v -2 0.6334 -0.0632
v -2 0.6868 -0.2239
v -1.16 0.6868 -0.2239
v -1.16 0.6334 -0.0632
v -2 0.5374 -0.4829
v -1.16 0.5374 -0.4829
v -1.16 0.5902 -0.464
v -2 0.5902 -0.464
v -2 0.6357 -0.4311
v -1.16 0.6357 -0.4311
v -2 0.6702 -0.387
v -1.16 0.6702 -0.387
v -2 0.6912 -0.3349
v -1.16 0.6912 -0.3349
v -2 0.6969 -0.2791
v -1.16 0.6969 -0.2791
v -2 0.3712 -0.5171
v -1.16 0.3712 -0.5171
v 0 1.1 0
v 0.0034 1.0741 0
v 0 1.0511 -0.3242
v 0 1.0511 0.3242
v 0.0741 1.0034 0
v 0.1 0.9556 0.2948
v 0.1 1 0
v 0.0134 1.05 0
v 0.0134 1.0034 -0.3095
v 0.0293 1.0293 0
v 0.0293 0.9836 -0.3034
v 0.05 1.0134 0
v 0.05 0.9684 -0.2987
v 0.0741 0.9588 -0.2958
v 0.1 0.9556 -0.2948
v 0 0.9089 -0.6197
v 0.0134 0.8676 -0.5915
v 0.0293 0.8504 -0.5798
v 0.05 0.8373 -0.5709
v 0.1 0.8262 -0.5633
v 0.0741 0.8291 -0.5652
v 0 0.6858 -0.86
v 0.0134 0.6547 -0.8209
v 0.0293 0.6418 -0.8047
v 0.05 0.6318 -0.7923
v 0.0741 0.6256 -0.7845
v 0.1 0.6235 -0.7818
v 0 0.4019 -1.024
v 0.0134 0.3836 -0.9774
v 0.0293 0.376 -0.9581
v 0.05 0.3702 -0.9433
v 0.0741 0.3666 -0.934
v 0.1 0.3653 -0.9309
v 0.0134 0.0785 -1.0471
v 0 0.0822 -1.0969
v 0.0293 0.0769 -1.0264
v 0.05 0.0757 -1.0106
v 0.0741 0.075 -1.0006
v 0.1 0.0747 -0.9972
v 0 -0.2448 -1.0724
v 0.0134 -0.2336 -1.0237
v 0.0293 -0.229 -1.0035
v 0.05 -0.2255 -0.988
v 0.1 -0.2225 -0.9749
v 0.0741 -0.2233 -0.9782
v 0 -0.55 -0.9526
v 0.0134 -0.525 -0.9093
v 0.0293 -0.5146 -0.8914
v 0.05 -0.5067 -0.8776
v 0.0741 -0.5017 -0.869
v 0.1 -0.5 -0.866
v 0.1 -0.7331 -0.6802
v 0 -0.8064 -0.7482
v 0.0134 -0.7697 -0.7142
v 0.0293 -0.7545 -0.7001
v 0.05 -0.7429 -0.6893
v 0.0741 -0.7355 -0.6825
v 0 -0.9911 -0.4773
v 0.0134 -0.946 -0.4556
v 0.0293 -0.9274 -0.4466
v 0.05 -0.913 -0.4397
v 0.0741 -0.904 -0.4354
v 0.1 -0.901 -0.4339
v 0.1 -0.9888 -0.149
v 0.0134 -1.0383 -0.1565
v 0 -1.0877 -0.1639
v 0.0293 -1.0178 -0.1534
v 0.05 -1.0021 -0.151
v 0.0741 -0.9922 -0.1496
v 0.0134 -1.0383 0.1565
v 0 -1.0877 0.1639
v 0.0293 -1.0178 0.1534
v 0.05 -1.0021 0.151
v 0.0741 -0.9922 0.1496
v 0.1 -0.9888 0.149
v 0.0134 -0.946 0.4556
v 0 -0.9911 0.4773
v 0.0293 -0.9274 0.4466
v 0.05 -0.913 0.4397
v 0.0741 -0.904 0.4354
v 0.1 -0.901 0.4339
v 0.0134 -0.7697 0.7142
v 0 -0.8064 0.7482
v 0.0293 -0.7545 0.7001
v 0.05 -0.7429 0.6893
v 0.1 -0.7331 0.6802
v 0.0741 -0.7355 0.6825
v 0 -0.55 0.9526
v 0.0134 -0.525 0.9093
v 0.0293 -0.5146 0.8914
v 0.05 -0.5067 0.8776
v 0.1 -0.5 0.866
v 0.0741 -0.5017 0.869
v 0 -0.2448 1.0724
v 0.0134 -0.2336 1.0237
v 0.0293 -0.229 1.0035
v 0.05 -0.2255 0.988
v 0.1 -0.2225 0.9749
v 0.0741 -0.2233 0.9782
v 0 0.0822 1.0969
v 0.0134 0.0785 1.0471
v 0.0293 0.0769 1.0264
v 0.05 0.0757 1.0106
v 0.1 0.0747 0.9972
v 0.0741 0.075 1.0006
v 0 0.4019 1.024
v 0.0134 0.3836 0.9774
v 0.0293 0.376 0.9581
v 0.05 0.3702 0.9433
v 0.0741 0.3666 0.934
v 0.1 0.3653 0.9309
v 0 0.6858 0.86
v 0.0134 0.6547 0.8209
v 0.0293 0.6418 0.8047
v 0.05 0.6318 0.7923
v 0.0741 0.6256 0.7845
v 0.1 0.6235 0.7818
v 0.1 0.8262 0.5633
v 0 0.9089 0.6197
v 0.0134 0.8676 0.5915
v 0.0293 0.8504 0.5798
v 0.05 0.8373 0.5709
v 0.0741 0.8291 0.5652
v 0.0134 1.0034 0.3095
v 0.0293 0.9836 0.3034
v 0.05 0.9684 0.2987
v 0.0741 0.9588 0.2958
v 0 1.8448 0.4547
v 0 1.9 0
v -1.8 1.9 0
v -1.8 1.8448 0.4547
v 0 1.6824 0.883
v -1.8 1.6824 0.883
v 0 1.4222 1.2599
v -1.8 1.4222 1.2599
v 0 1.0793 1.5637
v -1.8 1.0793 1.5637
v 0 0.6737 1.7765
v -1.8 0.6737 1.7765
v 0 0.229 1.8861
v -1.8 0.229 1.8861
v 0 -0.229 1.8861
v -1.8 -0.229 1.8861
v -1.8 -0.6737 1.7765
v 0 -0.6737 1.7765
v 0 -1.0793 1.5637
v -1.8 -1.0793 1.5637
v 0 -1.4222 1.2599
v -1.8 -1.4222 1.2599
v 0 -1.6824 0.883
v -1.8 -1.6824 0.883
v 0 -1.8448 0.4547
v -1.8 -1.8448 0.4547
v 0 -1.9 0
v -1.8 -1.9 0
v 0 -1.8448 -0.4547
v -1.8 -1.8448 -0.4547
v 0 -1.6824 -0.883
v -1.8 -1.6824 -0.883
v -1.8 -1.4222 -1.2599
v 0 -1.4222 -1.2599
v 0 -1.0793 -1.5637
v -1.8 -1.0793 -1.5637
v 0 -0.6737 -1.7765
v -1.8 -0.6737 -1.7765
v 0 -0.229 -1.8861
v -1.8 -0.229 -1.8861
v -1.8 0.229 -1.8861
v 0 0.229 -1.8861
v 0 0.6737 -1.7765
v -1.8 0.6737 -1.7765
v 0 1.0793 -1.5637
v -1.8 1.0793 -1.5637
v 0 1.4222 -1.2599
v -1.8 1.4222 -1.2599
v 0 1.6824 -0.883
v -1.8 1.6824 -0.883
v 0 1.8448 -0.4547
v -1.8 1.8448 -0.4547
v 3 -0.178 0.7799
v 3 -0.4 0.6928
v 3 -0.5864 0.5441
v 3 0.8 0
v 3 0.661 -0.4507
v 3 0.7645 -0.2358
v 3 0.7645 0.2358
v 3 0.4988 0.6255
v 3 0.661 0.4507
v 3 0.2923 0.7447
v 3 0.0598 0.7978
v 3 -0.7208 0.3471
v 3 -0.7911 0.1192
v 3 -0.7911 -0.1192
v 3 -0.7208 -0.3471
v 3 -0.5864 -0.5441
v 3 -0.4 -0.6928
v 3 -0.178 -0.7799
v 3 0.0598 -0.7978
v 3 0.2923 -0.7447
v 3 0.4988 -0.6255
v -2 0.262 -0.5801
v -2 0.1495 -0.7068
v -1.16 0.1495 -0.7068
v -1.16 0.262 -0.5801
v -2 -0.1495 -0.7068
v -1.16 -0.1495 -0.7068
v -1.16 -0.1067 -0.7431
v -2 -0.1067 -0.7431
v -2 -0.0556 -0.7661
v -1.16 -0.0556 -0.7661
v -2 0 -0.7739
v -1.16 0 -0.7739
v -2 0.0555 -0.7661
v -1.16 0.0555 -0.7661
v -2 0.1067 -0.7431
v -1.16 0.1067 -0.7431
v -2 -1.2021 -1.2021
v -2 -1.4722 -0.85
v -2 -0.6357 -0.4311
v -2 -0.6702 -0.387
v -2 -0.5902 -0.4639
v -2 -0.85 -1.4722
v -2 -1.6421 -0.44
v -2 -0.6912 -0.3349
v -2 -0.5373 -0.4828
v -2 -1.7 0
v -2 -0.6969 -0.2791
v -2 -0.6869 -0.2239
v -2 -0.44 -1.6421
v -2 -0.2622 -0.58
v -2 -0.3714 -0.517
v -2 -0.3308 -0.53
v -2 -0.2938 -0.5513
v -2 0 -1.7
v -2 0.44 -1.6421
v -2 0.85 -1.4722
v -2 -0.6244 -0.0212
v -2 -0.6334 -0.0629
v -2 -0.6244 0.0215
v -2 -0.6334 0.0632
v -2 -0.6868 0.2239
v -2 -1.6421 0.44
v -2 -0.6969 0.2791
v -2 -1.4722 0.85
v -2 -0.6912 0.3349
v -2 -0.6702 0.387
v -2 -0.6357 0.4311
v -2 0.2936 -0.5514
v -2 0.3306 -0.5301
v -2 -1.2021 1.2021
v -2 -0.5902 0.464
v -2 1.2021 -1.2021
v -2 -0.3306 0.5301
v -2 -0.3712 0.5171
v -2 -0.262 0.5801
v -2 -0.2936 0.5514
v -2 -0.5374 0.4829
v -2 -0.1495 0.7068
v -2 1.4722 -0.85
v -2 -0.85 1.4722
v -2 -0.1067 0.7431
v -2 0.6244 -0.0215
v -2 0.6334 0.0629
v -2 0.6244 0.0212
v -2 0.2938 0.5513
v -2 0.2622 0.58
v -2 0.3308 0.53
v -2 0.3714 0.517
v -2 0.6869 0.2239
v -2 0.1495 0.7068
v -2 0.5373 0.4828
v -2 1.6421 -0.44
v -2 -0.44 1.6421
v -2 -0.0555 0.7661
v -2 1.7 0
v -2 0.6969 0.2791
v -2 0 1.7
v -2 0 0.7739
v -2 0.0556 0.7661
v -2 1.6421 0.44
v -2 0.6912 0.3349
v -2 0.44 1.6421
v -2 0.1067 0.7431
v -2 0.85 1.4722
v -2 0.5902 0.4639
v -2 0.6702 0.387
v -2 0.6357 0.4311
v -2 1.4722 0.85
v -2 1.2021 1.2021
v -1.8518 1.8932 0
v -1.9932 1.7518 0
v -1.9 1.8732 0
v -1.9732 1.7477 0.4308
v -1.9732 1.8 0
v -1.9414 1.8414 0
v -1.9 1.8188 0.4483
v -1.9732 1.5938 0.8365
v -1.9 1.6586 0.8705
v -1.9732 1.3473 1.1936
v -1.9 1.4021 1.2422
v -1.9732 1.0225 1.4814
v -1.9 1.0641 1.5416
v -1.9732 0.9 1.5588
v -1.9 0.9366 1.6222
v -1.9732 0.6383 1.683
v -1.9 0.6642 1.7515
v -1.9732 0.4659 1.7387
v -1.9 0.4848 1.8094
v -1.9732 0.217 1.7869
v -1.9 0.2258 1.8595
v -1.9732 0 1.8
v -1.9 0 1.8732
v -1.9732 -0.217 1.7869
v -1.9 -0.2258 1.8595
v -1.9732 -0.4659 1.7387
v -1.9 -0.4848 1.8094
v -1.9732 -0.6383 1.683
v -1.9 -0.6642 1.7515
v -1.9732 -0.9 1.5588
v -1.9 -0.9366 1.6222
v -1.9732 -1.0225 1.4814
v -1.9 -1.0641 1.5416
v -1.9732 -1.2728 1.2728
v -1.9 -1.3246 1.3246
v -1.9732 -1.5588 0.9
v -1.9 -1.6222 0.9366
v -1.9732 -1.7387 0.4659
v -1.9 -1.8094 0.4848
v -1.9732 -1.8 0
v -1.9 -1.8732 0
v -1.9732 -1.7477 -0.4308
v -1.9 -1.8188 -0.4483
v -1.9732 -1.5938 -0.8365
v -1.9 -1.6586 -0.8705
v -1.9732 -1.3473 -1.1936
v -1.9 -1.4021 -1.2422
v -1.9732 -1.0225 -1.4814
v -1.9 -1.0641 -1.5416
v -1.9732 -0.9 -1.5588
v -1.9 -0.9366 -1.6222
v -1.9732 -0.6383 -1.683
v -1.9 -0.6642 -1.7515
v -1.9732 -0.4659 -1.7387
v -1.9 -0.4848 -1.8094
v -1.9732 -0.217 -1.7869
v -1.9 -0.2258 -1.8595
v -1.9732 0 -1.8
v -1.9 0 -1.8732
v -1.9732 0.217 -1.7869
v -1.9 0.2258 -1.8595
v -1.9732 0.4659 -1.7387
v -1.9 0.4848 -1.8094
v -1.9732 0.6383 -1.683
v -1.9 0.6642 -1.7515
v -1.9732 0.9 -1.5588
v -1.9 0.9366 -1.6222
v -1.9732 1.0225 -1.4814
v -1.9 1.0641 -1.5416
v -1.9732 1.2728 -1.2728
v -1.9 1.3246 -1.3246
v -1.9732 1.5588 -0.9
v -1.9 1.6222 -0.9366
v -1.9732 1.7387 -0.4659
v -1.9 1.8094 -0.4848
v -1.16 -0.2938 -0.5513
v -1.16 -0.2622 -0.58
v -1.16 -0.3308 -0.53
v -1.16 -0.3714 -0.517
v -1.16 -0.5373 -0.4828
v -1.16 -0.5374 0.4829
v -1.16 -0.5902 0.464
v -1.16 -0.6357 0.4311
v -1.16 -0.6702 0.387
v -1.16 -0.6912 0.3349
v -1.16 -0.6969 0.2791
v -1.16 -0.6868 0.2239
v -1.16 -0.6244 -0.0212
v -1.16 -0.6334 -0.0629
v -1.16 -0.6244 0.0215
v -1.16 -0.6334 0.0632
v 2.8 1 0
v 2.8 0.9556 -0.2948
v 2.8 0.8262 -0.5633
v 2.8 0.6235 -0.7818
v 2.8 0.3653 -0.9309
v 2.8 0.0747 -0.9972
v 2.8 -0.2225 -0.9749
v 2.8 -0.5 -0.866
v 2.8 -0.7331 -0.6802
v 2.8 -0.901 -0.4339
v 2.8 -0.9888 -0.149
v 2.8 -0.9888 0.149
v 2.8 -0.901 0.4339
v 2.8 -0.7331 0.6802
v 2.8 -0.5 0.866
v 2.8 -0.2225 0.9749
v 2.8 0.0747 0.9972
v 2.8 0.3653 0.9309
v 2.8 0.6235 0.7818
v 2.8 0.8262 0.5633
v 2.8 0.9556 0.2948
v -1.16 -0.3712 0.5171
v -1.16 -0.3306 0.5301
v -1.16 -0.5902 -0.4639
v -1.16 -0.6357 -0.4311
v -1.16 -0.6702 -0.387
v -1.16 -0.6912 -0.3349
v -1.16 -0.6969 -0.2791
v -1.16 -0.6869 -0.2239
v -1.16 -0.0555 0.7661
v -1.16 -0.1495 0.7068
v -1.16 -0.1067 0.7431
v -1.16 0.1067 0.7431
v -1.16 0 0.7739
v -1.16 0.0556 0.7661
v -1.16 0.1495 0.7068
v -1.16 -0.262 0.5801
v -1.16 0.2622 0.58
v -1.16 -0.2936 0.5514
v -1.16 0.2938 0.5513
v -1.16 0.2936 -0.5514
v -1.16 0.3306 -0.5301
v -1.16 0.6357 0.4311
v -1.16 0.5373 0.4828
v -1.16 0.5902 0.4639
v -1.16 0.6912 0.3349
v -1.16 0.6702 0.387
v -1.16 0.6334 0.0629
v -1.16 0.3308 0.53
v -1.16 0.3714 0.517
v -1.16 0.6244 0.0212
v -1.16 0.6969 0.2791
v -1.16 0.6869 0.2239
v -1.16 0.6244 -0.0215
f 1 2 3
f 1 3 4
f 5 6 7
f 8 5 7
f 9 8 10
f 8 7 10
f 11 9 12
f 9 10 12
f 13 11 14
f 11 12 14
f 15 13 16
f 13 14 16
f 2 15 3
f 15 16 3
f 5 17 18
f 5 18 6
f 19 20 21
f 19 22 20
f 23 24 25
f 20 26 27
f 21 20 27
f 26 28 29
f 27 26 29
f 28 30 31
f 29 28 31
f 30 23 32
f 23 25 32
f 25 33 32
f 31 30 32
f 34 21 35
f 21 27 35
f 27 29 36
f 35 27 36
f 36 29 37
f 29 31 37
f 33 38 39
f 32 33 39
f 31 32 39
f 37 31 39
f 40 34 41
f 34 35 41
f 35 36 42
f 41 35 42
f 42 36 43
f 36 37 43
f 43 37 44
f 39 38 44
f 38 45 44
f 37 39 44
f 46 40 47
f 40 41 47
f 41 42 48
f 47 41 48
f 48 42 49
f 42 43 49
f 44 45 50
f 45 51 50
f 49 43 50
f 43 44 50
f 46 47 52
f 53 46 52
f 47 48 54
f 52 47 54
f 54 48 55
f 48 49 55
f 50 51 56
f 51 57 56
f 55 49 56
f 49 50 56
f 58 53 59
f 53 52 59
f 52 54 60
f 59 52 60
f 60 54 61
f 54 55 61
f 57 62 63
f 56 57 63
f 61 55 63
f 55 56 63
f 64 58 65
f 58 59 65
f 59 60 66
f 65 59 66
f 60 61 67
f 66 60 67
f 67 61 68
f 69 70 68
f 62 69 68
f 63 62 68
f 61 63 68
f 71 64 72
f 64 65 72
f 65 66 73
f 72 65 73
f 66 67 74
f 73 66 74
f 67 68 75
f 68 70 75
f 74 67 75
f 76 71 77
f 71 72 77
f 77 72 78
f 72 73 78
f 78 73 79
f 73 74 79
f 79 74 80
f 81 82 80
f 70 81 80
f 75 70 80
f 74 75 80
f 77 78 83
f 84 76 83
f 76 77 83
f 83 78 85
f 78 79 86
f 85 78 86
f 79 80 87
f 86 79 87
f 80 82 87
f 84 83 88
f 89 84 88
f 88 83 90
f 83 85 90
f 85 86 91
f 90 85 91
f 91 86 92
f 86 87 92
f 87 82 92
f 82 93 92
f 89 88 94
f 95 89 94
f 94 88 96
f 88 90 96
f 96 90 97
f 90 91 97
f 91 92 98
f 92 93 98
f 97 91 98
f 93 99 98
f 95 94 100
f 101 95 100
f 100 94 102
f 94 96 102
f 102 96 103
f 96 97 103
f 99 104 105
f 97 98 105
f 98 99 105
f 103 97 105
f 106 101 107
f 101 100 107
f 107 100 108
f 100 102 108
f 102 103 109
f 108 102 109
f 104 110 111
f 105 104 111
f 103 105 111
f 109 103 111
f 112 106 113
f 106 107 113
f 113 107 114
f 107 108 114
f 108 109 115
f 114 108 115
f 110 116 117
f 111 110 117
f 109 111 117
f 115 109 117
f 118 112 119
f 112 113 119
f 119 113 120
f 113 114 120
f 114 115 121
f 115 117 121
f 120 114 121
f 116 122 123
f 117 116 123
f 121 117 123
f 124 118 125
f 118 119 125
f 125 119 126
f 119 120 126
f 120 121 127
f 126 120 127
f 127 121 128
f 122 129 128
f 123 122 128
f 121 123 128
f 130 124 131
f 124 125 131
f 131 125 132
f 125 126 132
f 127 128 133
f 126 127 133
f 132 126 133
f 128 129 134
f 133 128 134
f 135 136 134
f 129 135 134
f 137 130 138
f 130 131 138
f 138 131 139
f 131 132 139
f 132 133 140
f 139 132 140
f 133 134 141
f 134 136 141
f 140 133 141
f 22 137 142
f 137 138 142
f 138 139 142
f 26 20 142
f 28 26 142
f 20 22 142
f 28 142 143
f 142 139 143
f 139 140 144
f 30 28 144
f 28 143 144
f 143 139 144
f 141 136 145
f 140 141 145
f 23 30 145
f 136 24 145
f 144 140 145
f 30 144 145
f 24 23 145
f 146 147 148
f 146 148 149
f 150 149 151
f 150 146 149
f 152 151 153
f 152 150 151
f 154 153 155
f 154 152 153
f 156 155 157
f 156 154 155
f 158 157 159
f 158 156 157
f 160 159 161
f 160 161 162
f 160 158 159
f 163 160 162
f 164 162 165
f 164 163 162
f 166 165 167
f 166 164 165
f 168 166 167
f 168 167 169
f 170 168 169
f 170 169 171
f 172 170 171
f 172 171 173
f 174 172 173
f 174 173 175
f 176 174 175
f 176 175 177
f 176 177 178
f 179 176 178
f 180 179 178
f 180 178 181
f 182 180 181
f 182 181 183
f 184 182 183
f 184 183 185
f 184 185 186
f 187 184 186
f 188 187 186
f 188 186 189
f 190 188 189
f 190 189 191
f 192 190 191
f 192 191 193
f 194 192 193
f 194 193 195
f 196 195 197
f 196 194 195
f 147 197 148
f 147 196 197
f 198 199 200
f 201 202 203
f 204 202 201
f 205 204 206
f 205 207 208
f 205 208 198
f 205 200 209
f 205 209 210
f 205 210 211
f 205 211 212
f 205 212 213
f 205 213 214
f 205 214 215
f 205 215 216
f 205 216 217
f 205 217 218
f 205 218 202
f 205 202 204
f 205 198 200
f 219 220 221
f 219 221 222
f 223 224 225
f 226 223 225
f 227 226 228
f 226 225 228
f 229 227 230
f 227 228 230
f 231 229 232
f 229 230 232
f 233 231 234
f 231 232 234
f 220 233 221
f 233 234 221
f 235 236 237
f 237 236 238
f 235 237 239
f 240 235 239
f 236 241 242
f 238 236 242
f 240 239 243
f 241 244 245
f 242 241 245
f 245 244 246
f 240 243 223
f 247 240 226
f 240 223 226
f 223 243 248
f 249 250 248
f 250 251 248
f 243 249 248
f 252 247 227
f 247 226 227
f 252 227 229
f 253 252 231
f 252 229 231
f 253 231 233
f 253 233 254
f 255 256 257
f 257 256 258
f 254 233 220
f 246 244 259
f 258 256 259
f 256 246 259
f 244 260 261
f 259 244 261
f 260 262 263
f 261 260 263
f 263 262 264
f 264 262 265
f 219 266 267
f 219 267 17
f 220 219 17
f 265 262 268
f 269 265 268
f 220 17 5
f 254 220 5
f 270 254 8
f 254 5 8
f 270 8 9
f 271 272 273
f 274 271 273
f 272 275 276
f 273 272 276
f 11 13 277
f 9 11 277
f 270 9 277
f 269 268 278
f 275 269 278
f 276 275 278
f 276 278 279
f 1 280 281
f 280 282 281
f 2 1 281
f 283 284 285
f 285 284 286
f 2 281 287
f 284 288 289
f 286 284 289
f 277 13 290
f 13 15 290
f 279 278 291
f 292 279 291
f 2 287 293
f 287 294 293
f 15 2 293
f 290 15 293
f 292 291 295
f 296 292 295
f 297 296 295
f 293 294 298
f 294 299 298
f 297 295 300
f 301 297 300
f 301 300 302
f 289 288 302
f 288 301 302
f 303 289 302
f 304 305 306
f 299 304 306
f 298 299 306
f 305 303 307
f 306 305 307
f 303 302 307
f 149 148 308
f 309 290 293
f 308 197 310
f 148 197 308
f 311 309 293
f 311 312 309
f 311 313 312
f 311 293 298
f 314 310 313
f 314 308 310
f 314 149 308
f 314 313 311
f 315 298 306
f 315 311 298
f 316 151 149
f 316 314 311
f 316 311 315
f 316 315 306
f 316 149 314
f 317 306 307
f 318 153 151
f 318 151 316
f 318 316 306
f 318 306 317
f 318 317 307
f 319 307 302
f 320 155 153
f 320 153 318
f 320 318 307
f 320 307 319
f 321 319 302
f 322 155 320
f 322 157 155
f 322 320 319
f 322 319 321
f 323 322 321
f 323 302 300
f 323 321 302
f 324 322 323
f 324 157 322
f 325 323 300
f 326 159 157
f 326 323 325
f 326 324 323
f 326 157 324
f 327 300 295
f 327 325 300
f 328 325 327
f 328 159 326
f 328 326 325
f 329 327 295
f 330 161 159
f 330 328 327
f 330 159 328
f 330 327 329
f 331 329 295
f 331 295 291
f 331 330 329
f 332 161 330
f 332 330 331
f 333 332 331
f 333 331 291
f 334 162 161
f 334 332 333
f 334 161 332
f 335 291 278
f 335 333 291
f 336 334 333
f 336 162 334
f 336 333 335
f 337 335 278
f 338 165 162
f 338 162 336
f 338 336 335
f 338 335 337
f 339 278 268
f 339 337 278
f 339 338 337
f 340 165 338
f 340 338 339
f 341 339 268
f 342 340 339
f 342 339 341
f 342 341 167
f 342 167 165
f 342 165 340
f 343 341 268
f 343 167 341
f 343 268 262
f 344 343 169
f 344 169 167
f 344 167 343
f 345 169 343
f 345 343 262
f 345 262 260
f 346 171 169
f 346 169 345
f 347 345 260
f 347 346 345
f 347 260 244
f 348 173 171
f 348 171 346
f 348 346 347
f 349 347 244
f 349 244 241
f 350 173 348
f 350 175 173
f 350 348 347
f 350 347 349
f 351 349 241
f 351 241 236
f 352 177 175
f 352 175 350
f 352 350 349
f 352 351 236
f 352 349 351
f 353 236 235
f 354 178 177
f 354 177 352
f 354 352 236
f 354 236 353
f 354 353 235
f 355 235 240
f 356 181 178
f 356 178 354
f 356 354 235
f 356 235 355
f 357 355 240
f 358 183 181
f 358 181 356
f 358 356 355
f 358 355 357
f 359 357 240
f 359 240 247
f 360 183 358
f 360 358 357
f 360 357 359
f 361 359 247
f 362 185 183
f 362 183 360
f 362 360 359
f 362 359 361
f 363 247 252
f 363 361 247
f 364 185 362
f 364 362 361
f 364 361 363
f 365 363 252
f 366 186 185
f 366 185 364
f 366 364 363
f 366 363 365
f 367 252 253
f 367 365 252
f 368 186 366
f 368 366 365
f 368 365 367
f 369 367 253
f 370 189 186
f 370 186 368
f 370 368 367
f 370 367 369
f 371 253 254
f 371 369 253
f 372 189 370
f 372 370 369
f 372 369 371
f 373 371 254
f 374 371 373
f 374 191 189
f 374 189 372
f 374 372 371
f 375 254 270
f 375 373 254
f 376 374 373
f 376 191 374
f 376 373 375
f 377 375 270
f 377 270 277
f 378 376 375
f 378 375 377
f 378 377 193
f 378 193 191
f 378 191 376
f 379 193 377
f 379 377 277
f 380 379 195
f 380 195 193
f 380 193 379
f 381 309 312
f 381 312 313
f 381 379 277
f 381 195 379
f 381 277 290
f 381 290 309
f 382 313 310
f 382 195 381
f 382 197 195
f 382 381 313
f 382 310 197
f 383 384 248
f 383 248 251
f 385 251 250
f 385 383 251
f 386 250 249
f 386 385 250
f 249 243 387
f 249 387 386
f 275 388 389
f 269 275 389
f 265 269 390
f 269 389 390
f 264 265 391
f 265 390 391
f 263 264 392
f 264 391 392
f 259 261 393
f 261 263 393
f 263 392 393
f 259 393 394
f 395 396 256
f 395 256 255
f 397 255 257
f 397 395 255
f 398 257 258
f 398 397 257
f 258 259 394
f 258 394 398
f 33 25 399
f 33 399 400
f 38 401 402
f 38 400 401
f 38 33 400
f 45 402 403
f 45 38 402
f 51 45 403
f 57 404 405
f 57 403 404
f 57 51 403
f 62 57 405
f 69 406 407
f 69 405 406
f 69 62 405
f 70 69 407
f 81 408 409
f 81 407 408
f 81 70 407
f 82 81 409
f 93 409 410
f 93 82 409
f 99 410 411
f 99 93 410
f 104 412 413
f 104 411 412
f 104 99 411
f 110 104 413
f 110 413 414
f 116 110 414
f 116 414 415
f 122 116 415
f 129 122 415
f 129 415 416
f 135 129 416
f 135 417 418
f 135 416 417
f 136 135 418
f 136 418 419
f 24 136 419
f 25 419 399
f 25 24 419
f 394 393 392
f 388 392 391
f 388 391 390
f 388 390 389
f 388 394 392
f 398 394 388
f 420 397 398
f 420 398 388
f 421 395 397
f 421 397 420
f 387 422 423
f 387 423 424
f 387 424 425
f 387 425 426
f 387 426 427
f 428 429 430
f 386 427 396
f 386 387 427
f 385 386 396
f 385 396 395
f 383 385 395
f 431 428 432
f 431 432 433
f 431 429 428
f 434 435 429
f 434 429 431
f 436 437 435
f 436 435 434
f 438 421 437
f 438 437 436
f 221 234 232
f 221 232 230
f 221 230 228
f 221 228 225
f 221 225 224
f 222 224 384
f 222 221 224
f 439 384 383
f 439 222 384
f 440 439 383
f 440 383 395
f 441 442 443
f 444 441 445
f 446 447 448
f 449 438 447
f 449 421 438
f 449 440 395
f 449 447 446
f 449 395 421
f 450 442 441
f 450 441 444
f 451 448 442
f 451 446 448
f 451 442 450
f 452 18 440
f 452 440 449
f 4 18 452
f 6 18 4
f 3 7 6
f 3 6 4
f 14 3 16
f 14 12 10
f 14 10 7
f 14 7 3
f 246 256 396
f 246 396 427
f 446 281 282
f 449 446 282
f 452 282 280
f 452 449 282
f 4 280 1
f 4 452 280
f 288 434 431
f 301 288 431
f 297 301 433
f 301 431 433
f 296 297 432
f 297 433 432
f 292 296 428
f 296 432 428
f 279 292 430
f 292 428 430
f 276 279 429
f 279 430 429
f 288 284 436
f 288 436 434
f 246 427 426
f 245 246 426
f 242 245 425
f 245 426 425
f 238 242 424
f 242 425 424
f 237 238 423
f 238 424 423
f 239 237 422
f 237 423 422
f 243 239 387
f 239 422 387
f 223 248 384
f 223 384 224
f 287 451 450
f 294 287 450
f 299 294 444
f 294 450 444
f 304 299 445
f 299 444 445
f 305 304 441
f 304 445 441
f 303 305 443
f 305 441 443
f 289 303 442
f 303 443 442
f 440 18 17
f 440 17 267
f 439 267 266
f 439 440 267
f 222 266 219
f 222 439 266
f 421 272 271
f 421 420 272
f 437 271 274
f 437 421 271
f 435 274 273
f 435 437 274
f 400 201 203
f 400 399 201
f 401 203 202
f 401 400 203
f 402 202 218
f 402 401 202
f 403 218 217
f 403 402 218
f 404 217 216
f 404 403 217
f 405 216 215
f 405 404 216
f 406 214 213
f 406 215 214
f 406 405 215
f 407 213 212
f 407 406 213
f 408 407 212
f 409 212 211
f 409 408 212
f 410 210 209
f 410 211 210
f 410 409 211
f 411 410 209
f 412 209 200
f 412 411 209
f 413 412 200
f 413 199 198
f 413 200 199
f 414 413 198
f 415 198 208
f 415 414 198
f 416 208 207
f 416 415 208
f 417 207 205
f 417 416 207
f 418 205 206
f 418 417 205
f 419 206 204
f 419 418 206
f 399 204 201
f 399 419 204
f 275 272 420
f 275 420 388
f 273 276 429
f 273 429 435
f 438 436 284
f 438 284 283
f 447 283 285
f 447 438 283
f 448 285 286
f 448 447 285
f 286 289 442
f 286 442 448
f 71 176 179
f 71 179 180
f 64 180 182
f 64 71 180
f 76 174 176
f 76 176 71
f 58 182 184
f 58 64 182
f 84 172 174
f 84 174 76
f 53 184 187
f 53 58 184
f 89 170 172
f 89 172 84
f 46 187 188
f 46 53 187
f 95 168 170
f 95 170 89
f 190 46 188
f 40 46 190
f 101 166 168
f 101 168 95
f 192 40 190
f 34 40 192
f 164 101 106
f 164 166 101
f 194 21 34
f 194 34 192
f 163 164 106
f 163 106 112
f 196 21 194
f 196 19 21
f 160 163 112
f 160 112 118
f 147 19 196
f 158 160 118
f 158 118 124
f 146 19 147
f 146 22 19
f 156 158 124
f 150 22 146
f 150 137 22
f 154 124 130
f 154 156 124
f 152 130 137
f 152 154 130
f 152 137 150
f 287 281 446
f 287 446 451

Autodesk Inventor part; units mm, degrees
ref_plane "YZ Plane" through (0, 0, 0) normal (1, 0, 0) x (0, 1, 0)
ref_plane "XZ Plane" through (0, 0, 0) normal (0, 1, 0) x (-1, 0, 0)
ref_plane "XY Plane" through (0, 0, 0) normal (0, 0, 1) x (1, 0, 0)
sketch "Sketch1" plane through (0, 0, 0) normal (0, 0, 1) x (1, 0, 0)
  line L0 (0, 0) -> (3, 0)
  line L1 (3, 0) -> (3, 1)
  line L2 (3, 1) -> (0, 1)
  line L3 (0, 1) -> (0, 0)
  line L4 (0, 0) -> (-2, 0)
  line L5 (-2, 0) -> (-2, 1.9)
  line L6 (-2, 1.9) -> (0, 1.9)
  line L7 (0, 1.9) -> (0, 0)
  dimension "d0" = 2
  dimension "d1" = 3.8
  dimension "d2" = 2
  dimension "d3" = 3
revolve "Revolution1" add sketch "Sketch1" angle 360 about axis through (0, 0, 0) along (1, 0, 0)
thread "Thread1" size "M2x0.4" class "6g" standard "ISO Metric profile" length 3
sketch "Sketch2" plane through (-2, 0, 0) normal (-1, 0, 0) x (0, 0, 1)
  circle A0 centre (0, 0) radius 0.875 construction
  circle A1 centre (0, 0) radius 0.6125 construction
  line L0 (-0.5304, -0.3063) -> (-0.875, 0)
  line L1 (0, 0) -> (-0.5304, -0.3063)
  line L2 (0, 0) -> (-0.5304, 0.3062)
  line L3 (-2.66, 0) -> (2.66, 0) construction
  line L4 (-0.875, 0) -> (-0.5304, 0.3062)
  dimension "d21" = 1.75
  dimension "d19" = 60
  dimension "d20" = 30
  dimension "d26" = 1.225
extrude "Extrusion1" cut sketch "Sketch2" against normal blind 0.84
pattern_circular "Circular Pattern1" count 6 over 360 about axis through (-2, 0, 0) along (1, 0, 0) of "Extrusion1"
fillet "Fillet2" radius 0.2 6 edges at (-1.58, 0.7578, -0.4375) (-1.58, 0.7578, 0.4375) (-1.58, 0, 0.875) (-1.58, -0.7578, 0.4375) (-1.58, -0.7578, -0.4375) (-1.58, 0, -0.875)
fillet "Fillet3" radius 0.2 6 edges at (-1.58, 0.6125, 0) (-1.58, 0.3062, -0.5304) (-1.58, -0.3063, -0.5304) (-1.58, -0.6125, 0) (-1.58, -0.3063, 0.5304) (-1.58, 0.3062, 0.5304)
fillet "Fillet4" radius 0.2 1 edges at (-2, -1.9, 0)
fillet "Fillet5" radius 0.1 1 edges at (0, -1, 0)
chamfer "Chamfer2" distance 0.2 angle 45 1 edges at (3, -1, 0)
equation "\"d0\" = d"
equation "\"d1\" = dk"
equation "\"d2\" = k"
equation "\"d3\" = l_"
equation "\"d6\" = b"
equation "\"d21\" = A_"
equation "\"d20\" = 0.5 * d19"
equation "\"d26\" = 0.7 * d21"
equation "\"d27\" = t"
equation "\"d32\" = v"
equation "\"d33\" = v"
equation "\"d34\" = v"
equation "\"d35\" = r"
equation "\"d36\" = v"
equation "\"A_\" = 1.75"
equation "\"d\" = 2"
equation "\"dk\" = 3.8"
equation "\"k\" = 2"
equation "\"l_\" = 3"
equation "\"lg\" = 0"
equation "\"t\" = 0.84"
equation "\"w\" = 0.55"
equation "\"v\" = 0.2"
equation "\"r\" = 0.1"
equation "\"da\" = 2.6"
equation "\"p\" = 0.4"
equation "\"ds_\" = d"
equation "\"GAL\" = 0.61345 * p"
equation "\"ls\" = 0"
equation "\"b\" = l_ - lg"
properties part number "Inbusschraube mit Innenrund ISO 14579 - M2x3-8.8" material "Stahl"
